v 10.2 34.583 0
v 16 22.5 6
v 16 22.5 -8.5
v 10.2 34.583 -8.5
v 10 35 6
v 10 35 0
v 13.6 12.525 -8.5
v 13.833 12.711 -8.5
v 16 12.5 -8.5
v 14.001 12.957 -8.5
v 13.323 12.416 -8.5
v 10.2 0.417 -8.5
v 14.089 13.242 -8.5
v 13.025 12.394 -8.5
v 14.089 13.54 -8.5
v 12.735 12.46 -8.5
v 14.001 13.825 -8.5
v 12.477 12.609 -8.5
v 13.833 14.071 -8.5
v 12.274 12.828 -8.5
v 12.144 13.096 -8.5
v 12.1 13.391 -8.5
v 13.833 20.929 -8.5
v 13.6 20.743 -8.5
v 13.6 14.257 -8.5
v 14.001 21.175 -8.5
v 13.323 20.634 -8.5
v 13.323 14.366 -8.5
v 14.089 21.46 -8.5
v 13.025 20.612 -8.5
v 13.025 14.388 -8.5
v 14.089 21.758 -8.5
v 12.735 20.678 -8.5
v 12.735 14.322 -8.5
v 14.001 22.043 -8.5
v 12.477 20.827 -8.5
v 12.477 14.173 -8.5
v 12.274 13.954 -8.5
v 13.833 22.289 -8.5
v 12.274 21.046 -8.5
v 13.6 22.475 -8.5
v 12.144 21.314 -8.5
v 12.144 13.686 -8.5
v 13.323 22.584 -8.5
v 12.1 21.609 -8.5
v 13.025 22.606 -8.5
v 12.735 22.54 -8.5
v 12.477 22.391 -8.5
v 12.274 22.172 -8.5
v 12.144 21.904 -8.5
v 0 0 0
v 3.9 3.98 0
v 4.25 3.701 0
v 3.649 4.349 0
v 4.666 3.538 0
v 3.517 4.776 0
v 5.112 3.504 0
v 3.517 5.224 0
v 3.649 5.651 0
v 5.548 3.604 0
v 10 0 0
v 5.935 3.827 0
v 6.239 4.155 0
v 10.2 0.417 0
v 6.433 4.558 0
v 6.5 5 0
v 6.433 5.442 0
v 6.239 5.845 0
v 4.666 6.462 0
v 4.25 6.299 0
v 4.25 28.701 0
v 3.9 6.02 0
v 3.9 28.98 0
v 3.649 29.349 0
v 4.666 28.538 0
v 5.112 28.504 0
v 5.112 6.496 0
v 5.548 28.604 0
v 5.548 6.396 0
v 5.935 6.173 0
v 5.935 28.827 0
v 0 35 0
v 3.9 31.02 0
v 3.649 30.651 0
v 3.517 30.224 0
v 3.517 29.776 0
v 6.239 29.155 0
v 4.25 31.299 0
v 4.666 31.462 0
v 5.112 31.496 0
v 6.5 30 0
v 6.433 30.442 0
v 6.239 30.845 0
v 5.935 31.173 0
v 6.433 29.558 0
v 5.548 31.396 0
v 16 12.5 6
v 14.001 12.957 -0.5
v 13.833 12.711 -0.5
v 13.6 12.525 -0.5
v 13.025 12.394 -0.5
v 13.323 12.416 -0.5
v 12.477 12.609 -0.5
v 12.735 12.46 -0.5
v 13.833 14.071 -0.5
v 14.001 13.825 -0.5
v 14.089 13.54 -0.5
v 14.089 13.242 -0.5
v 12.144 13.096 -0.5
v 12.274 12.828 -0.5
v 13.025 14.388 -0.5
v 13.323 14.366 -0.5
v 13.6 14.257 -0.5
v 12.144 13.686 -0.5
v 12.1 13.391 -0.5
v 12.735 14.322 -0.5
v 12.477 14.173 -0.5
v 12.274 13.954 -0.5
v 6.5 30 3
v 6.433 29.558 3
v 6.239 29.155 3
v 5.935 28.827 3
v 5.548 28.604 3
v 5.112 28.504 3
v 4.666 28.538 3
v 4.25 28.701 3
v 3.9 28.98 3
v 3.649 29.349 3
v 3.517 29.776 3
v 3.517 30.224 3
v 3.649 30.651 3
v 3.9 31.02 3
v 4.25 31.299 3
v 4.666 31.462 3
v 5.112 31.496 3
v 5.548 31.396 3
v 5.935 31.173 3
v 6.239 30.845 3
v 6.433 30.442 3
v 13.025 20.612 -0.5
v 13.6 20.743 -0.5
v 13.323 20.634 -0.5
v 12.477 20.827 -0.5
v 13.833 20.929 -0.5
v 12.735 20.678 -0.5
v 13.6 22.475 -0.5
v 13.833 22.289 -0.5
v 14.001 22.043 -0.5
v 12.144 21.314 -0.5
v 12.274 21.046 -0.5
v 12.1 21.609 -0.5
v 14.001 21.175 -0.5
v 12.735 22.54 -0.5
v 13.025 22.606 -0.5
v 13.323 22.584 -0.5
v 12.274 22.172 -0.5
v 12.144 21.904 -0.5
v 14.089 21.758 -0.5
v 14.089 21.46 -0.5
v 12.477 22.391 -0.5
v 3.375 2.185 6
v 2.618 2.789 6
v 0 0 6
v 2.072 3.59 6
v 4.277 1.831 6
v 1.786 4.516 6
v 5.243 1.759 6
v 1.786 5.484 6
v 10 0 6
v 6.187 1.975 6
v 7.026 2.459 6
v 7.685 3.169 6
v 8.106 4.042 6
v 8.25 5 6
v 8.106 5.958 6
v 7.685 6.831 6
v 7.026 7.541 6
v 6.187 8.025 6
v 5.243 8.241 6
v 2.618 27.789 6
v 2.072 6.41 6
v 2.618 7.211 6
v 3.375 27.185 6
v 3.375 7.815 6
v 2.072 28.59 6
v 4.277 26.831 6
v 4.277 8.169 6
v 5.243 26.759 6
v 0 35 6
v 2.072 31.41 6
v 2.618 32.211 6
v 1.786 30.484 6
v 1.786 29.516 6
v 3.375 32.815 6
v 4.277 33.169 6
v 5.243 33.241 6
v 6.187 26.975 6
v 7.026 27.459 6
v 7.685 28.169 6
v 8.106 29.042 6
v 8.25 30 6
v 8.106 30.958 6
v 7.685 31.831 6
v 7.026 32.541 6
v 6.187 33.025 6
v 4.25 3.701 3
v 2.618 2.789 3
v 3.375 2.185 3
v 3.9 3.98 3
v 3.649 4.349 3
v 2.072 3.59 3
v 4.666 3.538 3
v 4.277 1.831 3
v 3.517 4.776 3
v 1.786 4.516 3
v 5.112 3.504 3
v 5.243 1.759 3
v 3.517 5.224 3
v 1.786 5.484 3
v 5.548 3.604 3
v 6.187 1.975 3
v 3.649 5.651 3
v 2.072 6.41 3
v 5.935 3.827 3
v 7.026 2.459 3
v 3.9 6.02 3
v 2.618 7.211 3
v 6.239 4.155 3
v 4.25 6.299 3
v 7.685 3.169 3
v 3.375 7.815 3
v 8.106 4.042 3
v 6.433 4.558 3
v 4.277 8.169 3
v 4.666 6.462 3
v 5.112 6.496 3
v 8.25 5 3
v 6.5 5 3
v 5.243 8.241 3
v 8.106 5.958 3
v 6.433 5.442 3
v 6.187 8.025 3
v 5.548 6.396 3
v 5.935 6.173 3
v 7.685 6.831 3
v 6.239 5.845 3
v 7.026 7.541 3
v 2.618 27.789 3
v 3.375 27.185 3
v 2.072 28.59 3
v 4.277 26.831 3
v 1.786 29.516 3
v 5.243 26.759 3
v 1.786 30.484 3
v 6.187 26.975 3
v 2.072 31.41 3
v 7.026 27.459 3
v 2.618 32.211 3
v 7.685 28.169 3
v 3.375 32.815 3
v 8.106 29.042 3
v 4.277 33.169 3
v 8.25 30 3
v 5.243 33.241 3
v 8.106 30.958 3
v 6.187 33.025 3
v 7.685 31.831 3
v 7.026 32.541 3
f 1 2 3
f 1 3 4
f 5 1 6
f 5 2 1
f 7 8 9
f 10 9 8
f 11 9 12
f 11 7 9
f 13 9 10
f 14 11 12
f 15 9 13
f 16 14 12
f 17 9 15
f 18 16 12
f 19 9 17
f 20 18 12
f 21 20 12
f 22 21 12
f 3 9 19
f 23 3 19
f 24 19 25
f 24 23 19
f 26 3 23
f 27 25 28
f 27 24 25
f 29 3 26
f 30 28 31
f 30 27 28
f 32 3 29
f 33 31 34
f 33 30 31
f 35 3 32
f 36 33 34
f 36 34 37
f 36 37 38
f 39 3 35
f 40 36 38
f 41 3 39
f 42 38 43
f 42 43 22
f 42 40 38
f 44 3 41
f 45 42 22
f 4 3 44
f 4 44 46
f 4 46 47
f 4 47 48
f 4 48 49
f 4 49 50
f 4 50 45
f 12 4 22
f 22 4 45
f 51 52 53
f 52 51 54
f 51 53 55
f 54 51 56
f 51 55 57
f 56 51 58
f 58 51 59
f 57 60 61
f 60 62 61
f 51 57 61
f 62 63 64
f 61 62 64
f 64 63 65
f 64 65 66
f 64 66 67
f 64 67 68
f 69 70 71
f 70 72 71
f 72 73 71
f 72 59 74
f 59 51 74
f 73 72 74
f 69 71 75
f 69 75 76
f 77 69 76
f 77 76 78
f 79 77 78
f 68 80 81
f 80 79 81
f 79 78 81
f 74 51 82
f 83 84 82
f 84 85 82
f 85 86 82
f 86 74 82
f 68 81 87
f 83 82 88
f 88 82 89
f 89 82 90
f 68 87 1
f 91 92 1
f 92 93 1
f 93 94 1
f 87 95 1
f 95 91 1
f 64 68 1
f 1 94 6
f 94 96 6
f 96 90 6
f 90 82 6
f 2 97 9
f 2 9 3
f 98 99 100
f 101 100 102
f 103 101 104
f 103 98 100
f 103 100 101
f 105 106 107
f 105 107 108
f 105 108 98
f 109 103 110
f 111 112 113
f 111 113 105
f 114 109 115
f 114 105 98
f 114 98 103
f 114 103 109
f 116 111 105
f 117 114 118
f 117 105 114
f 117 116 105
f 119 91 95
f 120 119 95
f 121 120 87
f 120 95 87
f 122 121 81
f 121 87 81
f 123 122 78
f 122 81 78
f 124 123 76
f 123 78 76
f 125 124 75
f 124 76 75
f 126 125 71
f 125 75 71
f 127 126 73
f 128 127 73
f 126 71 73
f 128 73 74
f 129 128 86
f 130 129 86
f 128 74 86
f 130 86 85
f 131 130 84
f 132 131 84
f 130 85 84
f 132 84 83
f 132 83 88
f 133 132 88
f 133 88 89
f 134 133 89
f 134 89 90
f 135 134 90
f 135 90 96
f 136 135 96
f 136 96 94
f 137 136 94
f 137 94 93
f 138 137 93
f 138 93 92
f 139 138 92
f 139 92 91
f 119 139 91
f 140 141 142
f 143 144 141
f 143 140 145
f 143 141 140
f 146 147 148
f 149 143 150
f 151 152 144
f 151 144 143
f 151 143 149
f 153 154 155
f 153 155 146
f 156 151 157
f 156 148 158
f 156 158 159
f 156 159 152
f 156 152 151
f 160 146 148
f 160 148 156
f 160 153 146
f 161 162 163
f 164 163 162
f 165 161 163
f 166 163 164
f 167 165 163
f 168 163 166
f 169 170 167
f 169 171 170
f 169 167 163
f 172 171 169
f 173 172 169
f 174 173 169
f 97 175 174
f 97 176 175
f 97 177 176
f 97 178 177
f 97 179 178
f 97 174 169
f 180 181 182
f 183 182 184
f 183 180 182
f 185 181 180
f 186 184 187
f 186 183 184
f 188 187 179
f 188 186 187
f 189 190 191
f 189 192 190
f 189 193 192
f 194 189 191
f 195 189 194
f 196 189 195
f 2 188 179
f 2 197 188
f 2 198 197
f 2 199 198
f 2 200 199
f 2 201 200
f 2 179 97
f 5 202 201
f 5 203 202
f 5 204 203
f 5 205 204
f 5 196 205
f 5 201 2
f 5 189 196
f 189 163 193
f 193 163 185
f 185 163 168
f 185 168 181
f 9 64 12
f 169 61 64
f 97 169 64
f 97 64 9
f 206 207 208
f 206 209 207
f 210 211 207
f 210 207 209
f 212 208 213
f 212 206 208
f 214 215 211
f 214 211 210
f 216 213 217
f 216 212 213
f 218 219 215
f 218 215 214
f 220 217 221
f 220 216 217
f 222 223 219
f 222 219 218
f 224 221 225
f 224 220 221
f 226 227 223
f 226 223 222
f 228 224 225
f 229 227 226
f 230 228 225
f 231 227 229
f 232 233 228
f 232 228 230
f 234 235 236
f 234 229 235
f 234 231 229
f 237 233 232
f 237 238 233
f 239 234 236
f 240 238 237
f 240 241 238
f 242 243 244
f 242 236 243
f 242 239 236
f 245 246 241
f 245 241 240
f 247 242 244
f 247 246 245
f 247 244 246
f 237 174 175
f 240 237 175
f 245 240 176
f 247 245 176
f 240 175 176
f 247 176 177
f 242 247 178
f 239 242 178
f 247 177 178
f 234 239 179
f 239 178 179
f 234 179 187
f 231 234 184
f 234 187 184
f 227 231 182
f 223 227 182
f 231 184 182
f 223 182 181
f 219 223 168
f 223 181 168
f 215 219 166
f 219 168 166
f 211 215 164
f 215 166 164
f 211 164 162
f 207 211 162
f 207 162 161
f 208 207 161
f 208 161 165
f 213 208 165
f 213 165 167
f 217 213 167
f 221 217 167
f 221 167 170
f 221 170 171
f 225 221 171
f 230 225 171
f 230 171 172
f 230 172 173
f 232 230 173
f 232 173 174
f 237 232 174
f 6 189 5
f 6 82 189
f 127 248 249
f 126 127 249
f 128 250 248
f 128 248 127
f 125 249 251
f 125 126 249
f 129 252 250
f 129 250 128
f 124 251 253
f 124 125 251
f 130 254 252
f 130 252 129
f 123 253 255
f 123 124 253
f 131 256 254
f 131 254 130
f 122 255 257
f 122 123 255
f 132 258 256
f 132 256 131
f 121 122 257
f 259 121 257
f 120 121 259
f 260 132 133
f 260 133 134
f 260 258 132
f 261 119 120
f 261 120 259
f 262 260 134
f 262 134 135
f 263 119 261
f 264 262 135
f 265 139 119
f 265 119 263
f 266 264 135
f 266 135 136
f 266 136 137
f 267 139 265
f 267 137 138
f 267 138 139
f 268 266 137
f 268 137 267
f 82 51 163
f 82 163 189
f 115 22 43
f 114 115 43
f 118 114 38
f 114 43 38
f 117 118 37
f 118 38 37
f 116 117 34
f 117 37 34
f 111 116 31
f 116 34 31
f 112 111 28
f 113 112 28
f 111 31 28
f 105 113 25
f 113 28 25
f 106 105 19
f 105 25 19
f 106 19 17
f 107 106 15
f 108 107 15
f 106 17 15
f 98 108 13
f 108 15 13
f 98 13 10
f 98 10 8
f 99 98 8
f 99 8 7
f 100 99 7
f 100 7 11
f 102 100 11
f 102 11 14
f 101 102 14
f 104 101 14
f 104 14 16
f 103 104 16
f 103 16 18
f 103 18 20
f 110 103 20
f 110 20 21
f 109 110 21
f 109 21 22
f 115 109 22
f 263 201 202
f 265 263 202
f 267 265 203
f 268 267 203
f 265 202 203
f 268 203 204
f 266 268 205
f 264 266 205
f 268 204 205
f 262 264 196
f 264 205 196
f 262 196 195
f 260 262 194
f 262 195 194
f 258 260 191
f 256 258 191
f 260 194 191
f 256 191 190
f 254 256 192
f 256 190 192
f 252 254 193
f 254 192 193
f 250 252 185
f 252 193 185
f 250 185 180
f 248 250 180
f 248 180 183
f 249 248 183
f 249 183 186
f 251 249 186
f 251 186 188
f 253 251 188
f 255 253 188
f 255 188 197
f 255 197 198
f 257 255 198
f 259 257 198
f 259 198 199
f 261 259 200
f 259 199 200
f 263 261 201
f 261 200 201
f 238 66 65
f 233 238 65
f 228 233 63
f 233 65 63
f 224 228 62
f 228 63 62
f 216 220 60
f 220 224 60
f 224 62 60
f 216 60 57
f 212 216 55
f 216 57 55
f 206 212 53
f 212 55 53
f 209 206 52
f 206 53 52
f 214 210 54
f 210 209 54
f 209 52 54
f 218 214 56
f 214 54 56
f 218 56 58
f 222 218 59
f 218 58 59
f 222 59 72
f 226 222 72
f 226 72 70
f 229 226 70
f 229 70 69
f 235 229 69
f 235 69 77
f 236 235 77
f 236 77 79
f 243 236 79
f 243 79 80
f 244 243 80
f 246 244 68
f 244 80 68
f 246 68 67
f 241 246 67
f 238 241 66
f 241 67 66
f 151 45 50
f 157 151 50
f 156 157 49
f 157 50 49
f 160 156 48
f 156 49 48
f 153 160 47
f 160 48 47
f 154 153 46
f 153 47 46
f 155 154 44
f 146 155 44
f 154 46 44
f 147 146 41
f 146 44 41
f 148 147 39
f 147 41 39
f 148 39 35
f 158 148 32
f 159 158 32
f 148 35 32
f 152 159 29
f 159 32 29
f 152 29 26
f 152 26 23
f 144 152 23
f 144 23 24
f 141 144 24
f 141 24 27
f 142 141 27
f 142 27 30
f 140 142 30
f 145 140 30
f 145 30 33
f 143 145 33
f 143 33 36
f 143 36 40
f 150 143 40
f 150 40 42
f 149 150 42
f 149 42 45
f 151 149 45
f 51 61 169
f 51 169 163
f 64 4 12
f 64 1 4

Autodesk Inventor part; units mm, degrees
ref_plane "YZ Plane" through (0, 0, 0) normal (1, 0, 0) x (0, 1, 0)
ref_plane "XZ Plane" through (0, 0, 0) normal (0, 1, 0) x (-1, 0, 0)
ref_plane "XY Plane" through (0, 0, 0) normal (0, 0, 1) x (1, 0, 0)
sketch "Sketch1" plane through (0, 0, 0) normal (0, 0, 1) x (1, 0, 0)
  line L0 (0, 0) -> (0, 5)
  line L1 (0, 5) -> (0, 30)
  line L2 (0, 30) -> (0, 35)
  line L3 (0, 35) -> (10, 35)
  line L4 (10, 35) -> (10, 0)
  line L5 (10, 0) -> (0, 0)
  line L6 (0, 35) -> (5, 35)
  line L7 (5, 35) -> (5, 0)
  circle A0 centre (5, 30) radius 1.5
  circle A1 centre (5, 5) radius 1.5
  line L8 (5, 17.5) -> (10, 17.5)
  line L9 (10, 17.5) -> (16, 17.5)
  line L10 (16, 17.5) -> (16, 12.5)
  line L11 (16, 17.5) -> (16, 22.5)
  line L12 (16, 22.5) -> (10, 35)
  line L13 (16, 12.5) -> (10, 0)
  dimension "d0" = 5
  dimension "d1" = 25
  dimension "d2" = 5
  dimension "d3" = 10
  dimension "d4" = 5
  dimension "d5" = 3
  dimension "d6" = 3
  dimension "d7" = 6
  dimension "d8" = 5
  dimension "d9" = 5
extrude "Extrusion1" add sketch "Sketch1" along normal blind 6 contours L0 L1 L2 L3 L7 A0 A1 L5 | L7 A1 L8 L4 L5 | L4 L9 L10 L13 | L8 L7 A0 L3 L4 | L4 L12 L11 L9
sketch "Sketch2" plane through (0, 0, 0) normal (0, 0, -1) x (-1, 0, 0)
  line L0 (0, 35) -> (0, 0) projected
  line L1 (-10, 35) -> (0, 35) projected
  line L2 (-16, 22.5) -> (-10, 35) projected
  line L3 (-16, 12.5) -> (-16, 22.5) projected
  line L4 (-10, 0) -> (-16, 12.5) projected
  line L5 (0, 0) -> (-10, 0) projected
  circle A0 centre (-5, 30) radius 1.5 projected
  circle A1 centre (-5, 5) radius 1.5 projected
  line L6 (-10, 0) -> (-16, 12.5) projected
  line L7 (-10, 35) -> (-10, 0)
  line L8 (-10, 0) -> (-16, 12.5)
  line L9 (-16, 12.5) -> (-16, 22.5)
  line L10 (-10, 35) -> (-16, 22.5)
  line L11 (-10.2, 34.5833) -> (-10.2, 0.4167)
  point P0 (-10.2, 0.4167)
  dimension "d54" = 0.2
extrude "Extrusion2" add sketch "Sketch2" along normal blind 8.5 contours L11 L4 L3 L2
sketch "Sketch3" plane through (0, 0, 6) normal (0, 0, 1) x (1, 0, 0)
  line L0 (0, 35) -> (0, 0) projected
  line L1 (0, 0) -> (10, 0) projected
  line L2 (10, 0) -> (16, 12.5) projected
  line L3 (16, 12.5) -> (16, 22.5) projected
  line L4 (16, 22.5) -> (10, 35) projected
  line L5 (10, 35) -> (0, 35) projected
  circle A0 centre (5, 30) radius 1.5 projected
  circle A1 centre (5, 5) radius 1.5 projected
  circle A2 centre (5, 30) radius 3.25
  circle A3 centre (5, 5) radius 3.25
  dimension "d14" = 6.5
  dimension "d17" = 6.5
extrude "Extrusion3" cut sketch "Sketch3" against normal blind 3 contours A0 | A2 | A3
sketch "Sketch4" plane through (0, 0, -8.5) normal (0, 0, -1) x (-1, 0, 0)
  line L0 (-10.2, 34.5833) -> (-16, 22.5) projected
  line L1 (-16, 22.5) -> (-16, 12.5) projected
  line L2 (-16, 12.5) -> (-10.2, 0.4167) projected
  line L3 (0, 0) -> (-10, 0) projected
  line L4 (0, 35) -> (0, 0) projected
  line L5 (-10, 35) -> (0, 35) projected
  circle A0 centre (-5, 30) radius 1.5 projected
  circle A1 centre (-5, 5) radius 1.5 projected
  line L6 (-15.8046, 22.9071) -> (-13.1, 21.609)
  line L7 (-15.8046, 12.0929) -> (-13.1, 13.391)
  circle A2 centre (-13.1, 13.391) radius 1
  circle A3 centre (-13.1, 21.609) radius 1
  line L8 (-10.2, 34.5833) -> (-10.2, 0.4167) projected
  line L9 (-10, 0) -> (-10.2, 0.4167) projected
  line L10 (-10.2, 34.5833) -> (-10, 35) projected
  line L11 (-10.2, 0.4167) -> (-10.2, 34.5833) projected
  dimension "d39" = 3
  dimension "d41" = 90
  dimension "d42" = 3
  dimension "d43" = 90
  dimension "d45" = 2.9
  dimension "d46" = 2
  dimension "d47" = 2
  dimension "d52" = 8.2179
  dimension "d55" = 2.9
  dimension "d56" = 0.2
  dimension "d57" = 6
extrude "Extrusion4" cut sketch "Sketch4" against normal blind 8 contours A3 | A2
equation "\"d2\" = d0"
equation "\"d4\" = 0.5 * d3"
equation "\"d9\" = d8"
equation "\"d39\" = 0.5 * d36"
equation "\"d42\" = d39"
equation "\"d45\" = d55"
equation "\"d55\" = -0.5 * d56 + 0.5 * d57"
equation "\"d36\" = 6"
properties part number "Clamp"
